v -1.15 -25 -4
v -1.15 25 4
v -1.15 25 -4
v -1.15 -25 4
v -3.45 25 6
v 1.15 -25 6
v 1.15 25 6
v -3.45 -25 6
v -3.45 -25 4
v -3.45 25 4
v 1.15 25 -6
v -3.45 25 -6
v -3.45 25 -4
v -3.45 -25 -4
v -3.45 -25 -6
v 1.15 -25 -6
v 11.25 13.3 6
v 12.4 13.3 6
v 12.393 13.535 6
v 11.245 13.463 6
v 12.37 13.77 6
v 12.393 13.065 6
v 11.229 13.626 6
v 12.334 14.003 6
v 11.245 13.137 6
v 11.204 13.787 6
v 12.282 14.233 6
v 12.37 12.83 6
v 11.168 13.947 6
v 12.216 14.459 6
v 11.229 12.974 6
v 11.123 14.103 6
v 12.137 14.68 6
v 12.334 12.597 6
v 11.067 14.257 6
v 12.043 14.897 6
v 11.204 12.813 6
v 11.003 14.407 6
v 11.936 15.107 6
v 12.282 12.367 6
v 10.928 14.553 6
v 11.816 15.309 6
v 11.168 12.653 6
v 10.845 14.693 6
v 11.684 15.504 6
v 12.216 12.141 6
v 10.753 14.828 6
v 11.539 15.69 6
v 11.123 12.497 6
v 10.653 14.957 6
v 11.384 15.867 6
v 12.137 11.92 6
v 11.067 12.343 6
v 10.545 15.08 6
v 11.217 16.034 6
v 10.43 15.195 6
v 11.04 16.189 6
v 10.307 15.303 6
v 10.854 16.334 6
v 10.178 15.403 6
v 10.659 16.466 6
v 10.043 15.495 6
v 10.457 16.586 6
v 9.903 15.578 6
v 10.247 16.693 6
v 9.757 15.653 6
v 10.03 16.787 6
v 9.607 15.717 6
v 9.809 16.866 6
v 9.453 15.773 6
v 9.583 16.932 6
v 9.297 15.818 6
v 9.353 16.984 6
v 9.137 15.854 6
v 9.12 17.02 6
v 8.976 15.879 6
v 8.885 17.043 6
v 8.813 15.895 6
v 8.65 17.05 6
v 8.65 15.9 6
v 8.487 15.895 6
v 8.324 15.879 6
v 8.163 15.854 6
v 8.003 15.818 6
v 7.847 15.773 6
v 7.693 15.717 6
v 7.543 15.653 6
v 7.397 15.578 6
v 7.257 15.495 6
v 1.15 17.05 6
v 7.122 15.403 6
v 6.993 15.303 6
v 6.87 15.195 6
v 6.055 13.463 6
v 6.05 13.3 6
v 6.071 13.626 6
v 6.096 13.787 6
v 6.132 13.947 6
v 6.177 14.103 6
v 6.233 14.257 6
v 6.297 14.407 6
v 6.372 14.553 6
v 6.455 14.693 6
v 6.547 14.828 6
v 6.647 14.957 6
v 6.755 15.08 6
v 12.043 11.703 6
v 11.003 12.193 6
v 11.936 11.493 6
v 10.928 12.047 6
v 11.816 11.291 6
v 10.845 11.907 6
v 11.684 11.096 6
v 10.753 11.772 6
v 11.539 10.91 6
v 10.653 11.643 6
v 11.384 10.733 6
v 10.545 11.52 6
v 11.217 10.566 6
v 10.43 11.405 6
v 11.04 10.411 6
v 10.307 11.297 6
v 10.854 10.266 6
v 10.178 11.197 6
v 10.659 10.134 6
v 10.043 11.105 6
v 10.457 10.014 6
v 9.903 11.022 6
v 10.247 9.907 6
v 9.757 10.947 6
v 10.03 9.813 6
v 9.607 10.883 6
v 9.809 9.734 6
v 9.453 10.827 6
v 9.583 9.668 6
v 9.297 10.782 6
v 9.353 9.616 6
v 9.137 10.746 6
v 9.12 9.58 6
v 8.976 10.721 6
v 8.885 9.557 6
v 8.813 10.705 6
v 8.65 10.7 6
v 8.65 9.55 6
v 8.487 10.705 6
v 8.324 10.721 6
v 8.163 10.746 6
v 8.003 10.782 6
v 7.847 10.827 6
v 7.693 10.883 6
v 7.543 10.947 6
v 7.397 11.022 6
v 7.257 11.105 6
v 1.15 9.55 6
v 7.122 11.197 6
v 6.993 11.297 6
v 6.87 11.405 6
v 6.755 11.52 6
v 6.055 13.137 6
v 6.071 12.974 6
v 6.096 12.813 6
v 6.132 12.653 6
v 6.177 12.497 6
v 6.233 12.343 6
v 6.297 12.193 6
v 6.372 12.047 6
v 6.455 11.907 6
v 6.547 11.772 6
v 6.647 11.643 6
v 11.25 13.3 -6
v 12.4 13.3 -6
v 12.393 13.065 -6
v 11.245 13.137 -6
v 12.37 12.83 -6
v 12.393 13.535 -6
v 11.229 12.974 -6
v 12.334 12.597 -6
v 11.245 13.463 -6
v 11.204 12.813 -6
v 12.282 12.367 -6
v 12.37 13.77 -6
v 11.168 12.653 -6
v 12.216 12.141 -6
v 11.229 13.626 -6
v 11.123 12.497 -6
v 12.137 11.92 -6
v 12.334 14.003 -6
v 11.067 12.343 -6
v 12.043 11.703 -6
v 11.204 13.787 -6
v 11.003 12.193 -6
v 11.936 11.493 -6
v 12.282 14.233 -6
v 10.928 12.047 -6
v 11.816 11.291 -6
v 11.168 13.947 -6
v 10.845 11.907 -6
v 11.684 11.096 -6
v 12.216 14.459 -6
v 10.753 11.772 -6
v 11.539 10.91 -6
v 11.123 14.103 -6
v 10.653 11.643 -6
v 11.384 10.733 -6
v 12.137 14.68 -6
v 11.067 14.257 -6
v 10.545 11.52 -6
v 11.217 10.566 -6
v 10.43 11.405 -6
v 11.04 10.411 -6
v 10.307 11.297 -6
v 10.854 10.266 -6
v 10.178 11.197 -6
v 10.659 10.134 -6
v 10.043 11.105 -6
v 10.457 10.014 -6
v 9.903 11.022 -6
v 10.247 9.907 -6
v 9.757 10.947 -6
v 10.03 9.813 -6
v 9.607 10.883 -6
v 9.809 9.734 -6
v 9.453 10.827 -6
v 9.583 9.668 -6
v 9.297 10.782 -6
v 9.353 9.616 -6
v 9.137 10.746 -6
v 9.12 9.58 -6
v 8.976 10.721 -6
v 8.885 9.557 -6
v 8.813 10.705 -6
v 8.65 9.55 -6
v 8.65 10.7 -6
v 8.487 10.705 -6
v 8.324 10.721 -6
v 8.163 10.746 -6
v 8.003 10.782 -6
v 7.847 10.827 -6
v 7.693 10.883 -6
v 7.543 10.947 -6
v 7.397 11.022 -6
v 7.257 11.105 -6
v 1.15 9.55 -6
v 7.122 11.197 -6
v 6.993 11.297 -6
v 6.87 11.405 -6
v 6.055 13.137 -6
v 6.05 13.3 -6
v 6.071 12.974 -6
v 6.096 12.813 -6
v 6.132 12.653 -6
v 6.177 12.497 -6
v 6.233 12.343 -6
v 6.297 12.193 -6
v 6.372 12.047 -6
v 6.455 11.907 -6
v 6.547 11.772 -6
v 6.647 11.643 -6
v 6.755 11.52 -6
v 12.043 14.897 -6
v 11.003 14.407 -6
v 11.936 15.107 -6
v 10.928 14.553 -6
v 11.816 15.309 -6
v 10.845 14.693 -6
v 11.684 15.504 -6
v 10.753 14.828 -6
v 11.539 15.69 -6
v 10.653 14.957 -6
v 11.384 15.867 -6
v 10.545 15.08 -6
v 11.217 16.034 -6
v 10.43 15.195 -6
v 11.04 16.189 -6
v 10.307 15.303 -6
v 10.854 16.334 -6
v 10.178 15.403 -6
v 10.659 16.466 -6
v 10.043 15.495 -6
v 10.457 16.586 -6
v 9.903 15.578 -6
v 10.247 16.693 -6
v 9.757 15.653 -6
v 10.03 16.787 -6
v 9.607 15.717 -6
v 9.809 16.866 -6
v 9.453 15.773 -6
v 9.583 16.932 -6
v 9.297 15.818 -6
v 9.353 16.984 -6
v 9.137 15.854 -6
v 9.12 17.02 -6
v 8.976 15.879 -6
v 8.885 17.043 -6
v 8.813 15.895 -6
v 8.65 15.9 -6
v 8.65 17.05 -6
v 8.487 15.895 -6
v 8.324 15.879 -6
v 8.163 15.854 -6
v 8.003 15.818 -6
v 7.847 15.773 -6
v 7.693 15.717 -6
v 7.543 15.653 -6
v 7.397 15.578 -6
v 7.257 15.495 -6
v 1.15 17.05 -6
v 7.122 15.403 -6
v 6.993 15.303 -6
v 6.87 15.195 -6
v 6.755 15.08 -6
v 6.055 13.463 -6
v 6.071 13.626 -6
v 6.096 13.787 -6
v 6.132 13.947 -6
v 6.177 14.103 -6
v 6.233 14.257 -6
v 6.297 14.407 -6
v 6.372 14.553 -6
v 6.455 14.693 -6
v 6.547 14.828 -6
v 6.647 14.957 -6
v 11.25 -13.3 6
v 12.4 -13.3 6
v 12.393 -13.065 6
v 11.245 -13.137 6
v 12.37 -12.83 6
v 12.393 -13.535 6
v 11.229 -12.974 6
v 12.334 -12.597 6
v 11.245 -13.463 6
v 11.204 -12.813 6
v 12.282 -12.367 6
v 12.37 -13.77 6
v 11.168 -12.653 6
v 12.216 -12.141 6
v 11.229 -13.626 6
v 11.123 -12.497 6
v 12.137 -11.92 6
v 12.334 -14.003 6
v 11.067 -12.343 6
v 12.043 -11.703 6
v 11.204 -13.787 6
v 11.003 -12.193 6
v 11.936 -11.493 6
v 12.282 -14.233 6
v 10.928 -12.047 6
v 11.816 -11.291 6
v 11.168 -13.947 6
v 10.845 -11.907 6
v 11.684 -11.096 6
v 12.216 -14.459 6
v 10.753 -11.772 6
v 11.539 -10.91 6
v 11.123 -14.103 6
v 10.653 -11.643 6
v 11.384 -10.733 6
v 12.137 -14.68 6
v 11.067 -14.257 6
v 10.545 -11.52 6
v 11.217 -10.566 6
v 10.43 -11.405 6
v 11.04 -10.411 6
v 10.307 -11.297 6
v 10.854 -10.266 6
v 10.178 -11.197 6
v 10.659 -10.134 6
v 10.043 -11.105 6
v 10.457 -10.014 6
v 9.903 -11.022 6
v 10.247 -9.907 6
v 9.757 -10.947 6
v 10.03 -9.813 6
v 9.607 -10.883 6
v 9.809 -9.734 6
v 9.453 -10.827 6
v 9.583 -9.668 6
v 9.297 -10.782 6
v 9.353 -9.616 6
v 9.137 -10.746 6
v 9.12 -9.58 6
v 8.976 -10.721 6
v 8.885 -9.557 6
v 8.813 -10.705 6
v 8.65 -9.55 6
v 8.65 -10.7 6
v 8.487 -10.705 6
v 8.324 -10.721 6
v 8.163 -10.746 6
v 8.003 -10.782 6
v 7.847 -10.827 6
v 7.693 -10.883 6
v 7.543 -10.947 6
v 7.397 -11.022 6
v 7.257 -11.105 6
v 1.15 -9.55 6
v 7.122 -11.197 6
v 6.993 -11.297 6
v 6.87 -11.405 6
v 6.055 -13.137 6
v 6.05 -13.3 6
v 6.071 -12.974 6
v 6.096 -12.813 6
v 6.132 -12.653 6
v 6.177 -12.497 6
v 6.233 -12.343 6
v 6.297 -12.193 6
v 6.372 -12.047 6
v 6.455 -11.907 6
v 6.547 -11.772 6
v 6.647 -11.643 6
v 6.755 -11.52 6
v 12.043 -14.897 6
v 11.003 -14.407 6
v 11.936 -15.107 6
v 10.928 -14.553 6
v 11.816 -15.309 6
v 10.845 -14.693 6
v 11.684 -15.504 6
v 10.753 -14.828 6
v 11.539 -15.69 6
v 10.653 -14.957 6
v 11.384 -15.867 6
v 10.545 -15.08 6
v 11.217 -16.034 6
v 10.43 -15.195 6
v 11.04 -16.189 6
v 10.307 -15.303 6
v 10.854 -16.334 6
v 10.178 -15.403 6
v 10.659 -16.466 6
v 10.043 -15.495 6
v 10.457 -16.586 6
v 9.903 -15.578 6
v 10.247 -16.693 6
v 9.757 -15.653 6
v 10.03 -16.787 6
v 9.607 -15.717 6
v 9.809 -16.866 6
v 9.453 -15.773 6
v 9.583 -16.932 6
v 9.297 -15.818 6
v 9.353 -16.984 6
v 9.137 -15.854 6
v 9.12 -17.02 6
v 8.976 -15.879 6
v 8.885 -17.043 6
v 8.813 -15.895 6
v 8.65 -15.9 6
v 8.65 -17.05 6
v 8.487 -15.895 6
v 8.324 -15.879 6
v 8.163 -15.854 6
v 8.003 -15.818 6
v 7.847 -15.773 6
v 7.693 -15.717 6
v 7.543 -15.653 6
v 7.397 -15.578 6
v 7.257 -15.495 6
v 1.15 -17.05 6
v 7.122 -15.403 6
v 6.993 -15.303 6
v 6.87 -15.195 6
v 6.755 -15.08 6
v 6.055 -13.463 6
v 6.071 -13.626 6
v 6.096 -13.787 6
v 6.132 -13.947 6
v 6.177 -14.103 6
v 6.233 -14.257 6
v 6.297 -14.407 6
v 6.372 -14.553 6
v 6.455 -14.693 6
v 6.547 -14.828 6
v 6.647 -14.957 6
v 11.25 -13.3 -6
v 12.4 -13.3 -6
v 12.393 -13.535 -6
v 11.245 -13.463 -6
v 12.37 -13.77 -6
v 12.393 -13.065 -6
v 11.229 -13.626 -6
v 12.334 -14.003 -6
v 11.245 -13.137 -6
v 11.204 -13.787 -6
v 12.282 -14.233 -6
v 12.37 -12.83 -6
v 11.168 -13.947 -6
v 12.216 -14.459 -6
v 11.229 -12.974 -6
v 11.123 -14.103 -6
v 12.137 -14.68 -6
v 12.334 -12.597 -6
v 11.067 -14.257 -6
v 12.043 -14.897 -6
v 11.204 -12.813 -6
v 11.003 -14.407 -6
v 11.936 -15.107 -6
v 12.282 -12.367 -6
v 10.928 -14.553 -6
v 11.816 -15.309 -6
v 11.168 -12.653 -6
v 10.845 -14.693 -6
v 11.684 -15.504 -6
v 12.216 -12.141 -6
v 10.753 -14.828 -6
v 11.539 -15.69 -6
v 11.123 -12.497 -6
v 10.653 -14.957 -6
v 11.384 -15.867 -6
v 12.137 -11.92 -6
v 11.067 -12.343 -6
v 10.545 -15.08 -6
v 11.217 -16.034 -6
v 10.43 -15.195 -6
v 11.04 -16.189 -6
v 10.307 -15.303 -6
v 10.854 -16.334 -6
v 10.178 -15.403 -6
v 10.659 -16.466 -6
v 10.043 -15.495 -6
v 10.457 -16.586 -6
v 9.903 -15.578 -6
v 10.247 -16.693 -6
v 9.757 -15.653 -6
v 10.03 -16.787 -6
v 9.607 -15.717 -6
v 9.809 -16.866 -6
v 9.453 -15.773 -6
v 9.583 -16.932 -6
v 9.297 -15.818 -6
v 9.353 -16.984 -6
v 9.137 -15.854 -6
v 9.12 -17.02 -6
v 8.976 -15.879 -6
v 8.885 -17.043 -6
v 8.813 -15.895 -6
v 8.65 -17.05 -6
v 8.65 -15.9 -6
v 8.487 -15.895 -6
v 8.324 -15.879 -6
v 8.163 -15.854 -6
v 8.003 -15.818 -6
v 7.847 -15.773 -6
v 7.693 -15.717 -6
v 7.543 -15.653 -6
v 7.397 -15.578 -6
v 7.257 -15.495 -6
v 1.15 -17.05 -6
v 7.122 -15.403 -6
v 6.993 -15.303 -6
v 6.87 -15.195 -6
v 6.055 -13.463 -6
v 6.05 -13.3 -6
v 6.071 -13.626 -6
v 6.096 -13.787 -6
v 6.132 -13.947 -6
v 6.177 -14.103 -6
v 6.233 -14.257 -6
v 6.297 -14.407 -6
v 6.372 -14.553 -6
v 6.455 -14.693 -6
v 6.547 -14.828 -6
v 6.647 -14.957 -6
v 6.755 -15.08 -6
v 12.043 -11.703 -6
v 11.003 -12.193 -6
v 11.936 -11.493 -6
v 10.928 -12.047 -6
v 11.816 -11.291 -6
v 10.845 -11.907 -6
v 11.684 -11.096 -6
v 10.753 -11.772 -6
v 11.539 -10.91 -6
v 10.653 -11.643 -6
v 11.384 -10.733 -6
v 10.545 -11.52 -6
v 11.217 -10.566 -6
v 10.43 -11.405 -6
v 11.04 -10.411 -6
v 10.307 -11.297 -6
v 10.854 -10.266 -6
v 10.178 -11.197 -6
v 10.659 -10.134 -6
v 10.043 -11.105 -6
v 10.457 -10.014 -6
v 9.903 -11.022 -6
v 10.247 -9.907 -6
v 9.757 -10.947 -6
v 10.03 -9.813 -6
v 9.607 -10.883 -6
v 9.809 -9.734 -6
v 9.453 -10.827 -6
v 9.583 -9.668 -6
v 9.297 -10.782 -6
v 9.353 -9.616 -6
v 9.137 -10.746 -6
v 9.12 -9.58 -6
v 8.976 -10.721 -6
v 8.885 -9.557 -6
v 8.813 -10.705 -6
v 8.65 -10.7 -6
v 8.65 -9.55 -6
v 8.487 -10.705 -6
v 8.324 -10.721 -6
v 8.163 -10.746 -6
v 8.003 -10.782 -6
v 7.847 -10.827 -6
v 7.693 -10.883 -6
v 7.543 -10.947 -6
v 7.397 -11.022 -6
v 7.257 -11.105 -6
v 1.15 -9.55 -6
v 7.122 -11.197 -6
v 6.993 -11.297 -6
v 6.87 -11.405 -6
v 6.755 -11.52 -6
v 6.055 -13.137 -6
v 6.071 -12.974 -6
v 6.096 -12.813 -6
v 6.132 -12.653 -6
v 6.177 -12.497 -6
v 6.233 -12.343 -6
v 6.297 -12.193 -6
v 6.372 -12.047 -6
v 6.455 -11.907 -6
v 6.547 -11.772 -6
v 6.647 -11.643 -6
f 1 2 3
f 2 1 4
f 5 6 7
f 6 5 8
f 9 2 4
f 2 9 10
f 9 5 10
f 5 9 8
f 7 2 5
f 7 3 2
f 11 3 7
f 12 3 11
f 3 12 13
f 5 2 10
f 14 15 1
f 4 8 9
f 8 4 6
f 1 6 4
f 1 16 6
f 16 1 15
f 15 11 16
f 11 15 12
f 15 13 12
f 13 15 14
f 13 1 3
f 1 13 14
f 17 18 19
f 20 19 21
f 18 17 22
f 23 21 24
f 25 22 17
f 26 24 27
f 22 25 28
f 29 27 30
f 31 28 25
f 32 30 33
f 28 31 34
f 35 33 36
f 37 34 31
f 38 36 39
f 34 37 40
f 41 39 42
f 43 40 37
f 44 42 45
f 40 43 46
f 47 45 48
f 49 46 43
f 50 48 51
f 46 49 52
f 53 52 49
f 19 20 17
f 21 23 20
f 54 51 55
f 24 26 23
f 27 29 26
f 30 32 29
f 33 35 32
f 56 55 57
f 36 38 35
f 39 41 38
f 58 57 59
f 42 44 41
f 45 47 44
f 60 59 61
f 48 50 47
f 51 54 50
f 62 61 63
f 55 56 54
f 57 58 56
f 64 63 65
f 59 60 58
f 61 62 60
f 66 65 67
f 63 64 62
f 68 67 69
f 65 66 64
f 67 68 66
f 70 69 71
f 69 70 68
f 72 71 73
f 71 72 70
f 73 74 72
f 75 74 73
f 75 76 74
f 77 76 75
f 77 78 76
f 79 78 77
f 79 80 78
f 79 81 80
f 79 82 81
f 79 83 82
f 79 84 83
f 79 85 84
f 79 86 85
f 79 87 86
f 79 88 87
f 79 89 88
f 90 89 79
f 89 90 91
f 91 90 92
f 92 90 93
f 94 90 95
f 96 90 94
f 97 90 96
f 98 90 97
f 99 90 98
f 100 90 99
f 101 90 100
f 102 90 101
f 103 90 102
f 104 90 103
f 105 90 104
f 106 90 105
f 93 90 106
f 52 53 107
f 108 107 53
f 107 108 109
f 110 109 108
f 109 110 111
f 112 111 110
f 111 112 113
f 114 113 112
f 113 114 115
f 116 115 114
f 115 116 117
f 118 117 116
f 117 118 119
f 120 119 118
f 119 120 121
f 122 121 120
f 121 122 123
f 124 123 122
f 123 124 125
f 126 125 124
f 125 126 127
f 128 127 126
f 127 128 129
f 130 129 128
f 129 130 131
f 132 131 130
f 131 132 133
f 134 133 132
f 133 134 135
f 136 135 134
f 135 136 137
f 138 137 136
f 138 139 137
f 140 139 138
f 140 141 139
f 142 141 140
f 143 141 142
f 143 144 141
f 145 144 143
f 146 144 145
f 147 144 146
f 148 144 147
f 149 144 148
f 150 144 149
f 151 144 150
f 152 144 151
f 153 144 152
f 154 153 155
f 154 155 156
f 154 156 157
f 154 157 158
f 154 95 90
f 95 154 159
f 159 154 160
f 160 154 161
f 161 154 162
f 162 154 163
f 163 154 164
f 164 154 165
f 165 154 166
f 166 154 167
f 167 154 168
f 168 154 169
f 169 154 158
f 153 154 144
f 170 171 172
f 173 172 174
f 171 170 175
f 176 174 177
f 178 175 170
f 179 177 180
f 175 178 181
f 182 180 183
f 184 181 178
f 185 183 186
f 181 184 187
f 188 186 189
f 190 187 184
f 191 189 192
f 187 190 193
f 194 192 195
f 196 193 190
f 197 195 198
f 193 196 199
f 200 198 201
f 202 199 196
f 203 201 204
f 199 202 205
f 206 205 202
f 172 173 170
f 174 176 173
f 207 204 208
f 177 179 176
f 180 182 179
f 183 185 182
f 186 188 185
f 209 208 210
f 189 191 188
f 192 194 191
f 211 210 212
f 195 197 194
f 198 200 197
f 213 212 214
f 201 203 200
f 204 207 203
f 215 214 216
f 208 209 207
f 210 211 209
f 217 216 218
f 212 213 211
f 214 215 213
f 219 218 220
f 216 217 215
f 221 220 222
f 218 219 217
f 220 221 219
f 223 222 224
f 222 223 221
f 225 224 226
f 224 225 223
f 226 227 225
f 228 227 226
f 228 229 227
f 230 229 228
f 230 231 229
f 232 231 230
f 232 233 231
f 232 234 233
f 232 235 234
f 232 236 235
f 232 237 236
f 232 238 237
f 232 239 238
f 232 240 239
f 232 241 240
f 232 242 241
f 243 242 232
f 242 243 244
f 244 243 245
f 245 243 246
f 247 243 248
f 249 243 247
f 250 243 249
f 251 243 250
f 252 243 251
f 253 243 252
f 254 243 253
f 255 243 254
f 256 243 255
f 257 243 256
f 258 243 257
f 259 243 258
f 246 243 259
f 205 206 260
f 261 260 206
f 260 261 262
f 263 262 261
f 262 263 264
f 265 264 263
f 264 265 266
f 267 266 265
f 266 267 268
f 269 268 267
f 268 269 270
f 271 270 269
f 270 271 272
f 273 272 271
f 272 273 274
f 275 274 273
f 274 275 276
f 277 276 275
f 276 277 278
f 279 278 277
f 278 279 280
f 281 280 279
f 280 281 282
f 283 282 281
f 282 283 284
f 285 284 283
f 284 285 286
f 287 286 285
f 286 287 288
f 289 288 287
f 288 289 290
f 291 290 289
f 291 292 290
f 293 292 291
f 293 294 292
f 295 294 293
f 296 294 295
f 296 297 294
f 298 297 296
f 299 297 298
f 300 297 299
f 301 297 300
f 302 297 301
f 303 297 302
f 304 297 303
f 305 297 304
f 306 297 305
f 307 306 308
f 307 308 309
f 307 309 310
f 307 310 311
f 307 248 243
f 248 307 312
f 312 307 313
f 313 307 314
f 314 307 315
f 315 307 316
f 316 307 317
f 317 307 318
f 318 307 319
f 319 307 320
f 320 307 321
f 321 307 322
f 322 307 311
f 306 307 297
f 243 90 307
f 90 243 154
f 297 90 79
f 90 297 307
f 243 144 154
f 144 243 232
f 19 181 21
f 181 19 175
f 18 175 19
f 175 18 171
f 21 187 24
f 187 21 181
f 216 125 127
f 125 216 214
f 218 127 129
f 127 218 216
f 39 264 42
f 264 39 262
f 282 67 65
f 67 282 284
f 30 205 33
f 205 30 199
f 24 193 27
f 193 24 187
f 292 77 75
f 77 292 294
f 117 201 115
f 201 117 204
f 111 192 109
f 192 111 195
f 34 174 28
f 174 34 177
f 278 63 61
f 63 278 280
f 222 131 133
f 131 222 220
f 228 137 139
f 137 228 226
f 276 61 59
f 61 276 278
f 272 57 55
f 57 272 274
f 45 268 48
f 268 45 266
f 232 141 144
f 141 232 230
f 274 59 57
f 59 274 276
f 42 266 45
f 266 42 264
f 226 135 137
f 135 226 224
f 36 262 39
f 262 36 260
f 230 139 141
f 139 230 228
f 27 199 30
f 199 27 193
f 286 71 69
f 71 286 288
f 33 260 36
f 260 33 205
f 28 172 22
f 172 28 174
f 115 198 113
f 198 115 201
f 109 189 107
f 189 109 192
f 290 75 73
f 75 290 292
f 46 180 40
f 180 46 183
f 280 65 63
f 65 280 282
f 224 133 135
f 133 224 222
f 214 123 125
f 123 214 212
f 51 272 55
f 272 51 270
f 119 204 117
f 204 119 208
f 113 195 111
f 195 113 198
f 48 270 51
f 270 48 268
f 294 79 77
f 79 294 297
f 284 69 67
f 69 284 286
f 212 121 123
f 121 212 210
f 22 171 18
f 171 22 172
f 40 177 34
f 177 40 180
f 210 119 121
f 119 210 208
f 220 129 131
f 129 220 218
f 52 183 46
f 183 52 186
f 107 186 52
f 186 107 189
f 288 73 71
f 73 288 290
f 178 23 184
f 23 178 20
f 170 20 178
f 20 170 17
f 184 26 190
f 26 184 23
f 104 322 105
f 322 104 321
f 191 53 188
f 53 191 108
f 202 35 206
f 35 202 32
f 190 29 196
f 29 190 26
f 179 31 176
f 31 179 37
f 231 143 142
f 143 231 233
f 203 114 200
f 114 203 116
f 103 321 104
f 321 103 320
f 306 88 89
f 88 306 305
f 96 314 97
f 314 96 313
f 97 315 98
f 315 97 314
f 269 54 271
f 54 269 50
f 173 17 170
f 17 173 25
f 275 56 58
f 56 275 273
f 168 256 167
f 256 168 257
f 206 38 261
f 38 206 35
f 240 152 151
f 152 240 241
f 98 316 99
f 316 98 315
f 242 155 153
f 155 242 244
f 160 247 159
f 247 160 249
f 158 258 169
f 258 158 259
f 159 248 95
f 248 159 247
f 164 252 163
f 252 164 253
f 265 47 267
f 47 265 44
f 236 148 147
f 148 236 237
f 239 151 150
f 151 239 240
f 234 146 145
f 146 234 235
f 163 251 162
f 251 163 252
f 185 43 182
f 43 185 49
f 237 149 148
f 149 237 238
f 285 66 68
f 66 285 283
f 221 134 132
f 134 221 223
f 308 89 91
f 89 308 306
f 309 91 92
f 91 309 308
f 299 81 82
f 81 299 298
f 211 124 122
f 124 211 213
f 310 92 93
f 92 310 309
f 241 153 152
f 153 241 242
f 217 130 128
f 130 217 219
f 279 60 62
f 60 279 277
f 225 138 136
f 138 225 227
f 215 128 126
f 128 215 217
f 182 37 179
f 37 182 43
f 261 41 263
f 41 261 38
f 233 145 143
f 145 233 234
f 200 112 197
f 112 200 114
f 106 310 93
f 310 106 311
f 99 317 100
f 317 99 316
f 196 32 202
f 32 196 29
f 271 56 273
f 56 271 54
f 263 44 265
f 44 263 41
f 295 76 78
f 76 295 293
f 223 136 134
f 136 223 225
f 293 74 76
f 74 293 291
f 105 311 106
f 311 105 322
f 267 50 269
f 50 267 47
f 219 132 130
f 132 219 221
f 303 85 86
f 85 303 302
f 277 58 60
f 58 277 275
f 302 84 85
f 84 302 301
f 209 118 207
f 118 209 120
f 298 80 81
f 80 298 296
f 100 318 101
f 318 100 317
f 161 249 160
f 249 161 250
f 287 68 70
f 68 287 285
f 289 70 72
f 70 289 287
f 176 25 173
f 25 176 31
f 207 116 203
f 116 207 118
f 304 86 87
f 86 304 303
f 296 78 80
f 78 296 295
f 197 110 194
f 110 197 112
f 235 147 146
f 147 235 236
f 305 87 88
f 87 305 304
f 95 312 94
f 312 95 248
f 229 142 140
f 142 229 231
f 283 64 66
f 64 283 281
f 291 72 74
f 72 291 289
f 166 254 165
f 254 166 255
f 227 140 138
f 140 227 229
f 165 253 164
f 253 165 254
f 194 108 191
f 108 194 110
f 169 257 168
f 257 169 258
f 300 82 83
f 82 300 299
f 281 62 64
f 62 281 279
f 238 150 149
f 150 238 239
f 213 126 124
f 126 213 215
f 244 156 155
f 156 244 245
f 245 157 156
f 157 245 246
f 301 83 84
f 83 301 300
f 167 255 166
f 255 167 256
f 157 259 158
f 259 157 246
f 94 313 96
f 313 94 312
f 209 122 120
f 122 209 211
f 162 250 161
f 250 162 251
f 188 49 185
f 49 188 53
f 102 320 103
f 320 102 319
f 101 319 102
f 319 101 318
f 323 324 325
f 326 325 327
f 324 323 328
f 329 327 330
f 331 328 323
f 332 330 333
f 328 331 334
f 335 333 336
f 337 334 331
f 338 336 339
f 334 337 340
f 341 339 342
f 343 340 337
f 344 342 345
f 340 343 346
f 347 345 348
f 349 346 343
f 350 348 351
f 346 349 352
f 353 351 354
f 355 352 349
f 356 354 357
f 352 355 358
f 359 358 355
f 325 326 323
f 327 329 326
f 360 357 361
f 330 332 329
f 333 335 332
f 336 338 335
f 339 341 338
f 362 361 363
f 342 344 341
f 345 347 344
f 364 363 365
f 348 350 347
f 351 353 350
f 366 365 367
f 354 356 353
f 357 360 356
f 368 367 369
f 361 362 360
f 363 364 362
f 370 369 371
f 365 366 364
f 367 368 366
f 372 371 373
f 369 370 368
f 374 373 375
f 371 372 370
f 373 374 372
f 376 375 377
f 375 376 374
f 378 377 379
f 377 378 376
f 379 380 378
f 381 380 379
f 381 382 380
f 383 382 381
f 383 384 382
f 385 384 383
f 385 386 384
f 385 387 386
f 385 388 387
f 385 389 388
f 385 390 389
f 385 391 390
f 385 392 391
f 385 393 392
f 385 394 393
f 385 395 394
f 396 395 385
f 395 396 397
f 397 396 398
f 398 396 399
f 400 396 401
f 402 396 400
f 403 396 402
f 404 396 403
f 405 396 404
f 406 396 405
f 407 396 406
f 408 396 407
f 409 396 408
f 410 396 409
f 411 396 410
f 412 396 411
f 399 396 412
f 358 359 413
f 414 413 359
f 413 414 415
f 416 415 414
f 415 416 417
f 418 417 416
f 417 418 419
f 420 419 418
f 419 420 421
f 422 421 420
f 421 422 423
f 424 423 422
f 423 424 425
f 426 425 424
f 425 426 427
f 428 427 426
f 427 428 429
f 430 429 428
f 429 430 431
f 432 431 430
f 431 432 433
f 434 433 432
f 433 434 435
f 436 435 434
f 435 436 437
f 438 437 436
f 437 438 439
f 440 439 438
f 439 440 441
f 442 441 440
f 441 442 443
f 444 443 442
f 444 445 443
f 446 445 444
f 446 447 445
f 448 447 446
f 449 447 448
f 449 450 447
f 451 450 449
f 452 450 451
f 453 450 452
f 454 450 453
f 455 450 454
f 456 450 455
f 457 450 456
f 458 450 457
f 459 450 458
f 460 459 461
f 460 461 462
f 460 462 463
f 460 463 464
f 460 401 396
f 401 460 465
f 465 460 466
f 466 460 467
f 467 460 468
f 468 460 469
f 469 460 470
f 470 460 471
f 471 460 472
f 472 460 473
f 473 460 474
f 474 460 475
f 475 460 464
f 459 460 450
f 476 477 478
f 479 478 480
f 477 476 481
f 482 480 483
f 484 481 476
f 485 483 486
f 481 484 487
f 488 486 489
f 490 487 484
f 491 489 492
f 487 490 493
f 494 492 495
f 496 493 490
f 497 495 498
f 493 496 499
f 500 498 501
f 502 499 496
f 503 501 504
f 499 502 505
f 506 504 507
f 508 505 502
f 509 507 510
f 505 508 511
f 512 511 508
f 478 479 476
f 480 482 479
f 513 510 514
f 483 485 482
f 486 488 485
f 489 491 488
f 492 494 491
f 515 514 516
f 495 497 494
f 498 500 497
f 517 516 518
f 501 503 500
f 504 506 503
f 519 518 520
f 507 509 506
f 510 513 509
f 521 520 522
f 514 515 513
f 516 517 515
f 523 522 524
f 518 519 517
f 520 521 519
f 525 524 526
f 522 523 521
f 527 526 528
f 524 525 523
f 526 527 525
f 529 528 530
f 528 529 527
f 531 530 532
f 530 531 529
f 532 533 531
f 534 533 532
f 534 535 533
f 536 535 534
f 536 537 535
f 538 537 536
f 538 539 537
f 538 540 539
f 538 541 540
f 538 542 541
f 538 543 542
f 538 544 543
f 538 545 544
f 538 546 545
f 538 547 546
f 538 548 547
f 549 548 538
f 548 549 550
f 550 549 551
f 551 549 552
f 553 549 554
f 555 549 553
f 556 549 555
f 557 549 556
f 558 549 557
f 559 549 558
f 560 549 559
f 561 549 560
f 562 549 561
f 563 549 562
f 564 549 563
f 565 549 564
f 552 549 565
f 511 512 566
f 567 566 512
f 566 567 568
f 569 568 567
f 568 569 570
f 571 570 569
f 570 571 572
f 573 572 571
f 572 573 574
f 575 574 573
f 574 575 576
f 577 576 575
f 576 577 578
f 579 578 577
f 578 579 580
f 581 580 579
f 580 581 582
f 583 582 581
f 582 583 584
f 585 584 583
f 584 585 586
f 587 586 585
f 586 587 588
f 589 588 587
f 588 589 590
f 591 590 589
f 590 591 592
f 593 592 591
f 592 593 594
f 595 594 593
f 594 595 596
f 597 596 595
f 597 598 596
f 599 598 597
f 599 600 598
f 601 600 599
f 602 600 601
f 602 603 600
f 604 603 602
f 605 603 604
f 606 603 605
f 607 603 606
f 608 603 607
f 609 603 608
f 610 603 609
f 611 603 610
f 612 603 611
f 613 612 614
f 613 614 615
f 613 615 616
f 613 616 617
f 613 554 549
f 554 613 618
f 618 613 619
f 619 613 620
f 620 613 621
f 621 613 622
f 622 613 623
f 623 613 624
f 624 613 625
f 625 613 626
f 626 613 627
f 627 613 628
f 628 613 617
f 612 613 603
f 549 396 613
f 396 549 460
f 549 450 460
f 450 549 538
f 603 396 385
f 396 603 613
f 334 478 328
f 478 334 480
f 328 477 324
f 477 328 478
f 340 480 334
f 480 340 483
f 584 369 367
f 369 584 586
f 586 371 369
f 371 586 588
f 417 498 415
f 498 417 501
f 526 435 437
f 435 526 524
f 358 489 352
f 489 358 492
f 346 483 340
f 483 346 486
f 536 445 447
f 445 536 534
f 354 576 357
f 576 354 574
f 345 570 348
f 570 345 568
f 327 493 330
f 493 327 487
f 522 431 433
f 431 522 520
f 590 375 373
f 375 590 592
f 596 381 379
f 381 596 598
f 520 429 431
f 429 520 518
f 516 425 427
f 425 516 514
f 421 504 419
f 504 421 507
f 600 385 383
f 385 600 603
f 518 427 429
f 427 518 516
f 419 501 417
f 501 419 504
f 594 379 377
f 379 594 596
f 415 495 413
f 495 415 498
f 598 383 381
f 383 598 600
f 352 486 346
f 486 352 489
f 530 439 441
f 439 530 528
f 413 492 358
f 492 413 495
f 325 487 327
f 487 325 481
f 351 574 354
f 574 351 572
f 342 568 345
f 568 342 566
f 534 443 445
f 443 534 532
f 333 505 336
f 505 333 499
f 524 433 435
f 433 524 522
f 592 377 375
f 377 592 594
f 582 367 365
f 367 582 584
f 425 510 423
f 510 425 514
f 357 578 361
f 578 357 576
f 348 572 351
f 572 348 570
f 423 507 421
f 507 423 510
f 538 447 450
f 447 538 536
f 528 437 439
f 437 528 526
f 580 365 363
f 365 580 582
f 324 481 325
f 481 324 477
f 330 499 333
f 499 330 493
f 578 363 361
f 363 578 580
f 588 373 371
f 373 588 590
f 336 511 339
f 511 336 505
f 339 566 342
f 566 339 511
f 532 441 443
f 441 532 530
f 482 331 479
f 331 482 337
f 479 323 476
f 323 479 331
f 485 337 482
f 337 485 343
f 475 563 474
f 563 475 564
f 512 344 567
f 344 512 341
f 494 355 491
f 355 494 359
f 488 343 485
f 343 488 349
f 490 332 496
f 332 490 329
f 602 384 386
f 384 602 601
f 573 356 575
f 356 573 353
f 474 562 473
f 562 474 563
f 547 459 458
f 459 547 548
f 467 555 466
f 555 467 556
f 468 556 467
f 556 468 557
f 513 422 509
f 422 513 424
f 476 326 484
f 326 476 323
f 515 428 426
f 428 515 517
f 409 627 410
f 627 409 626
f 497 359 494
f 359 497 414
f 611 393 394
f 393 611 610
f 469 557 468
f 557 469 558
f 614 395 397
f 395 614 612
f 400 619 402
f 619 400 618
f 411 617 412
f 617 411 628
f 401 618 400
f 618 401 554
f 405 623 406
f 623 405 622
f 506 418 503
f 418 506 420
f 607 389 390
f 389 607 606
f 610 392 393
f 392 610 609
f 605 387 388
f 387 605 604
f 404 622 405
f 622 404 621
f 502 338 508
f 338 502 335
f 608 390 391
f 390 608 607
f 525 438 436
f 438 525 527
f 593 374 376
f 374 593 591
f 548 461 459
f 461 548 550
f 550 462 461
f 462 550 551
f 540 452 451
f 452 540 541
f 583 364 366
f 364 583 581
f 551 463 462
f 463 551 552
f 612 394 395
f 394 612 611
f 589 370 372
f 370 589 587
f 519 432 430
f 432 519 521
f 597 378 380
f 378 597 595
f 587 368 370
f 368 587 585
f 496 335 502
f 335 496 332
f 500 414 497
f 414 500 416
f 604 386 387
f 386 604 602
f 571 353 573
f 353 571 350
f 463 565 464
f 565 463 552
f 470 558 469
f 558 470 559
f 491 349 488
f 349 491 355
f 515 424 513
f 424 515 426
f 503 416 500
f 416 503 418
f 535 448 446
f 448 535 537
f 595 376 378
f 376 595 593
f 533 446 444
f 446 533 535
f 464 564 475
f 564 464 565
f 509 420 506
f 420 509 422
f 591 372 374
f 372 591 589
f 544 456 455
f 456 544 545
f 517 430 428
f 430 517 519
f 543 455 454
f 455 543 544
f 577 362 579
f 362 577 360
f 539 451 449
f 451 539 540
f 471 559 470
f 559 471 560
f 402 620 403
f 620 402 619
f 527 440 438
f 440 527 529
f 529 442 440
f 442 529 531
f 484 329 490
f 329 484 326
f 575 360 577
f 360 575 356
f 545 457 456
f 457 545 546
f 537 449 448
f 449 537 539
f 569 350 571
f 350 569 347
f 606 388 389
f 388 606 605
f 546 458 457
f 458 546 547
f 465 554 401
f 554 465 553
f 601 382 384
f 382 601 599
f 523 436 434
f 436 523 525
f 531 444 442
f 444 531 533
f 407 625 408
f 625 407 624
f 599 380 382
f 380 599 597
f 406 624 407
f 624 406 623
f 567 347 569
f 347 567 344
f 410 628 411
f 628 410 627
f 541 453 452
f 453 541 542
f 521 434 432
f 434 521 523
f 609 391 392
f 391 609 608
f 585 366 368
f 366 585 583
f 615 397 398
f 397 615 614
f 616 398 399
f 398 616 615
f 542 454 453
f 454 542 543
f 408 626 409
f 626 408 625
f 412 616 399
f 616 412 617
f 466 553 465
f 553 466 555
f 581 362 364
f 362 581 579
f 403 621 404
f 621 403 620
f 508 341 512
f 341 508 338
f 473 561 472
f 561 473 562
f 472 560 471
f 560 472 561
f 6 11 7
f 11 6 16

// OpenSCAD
// 2016 Paul Nokel <pnokel@gmail.com>
// LED Bar (this is the sruface on which you mount your LED strip)
led_bar_height = 12; // [10:100]
led_bar_width = 50; // [10:200]
led_bar_thickness=2.3; // [1:0.1:10]

// Add a top and bottom border to the LED bar
add_border = 1; // [1:Yes,0:No]
border_thickness = 2; // [1:10]

alu_spacer_diameter = 5; // [1:15]
// Distance between the spacers
alu_spacer_distance = 26.6; // [1:0.1:100]

/* [Hidden] */
mounting_hole_outer_diameter=alu_spacer_diameter+alu_spacer_diameter/2;
// adjust the diameter of the spacer
alu_spacer_diameter_real=alu_spacer_diameter+0.2;

// LED Strip
cube([led_bar_thickness, led_bar_width, led_bar_height], center=true);
// LED Strip Border
if(add_border == 1) {
    translate([-led_bar_thickness, 0, led_bar_height/2-border_thickness/2]) cube([led_bar_thickness, led_bar_width, border_thickness], center=true);
    mirror([0, 0, 1]) translate([-led_bar_thickness, 0, led_bar_height/2-border_thickness/2]) cube([led_bar_thickness, led_bar_width, border_thickness], center=true);
}
// mounting holes for the spacers
translate([mounting_hole_outer_diameter+led_bar_thickness/2, alu_spacer_distance/2, 0]) genSpacerMountingPoint();
mirror([0, -1, 0]) translate([mounting_hole_outer_diameter+led_bar_thickness/2, alu_spacer_distance/2, 0]) genSpacerMountingPoint();

module genSpacerMountingPoint() {
    difference() {
        union() {
            translate([-mounting_hole_outer_diameter/2, 0, 0]) cube([mounting_hole_outer_diameter, mounting_hole_outer_diameter, led_bar_height], center=true);
            cylinder(led_bar_height, mounting_hole_outer_diameter/2, mounting_hole_outer_diameter/2, center=true, $fn=100);
        }
        cylinder(led_bar_height, alu_spacer_diameter_real/2, alu_spacer_diameter_real/2, center=true, $fn=100);
    }
}
